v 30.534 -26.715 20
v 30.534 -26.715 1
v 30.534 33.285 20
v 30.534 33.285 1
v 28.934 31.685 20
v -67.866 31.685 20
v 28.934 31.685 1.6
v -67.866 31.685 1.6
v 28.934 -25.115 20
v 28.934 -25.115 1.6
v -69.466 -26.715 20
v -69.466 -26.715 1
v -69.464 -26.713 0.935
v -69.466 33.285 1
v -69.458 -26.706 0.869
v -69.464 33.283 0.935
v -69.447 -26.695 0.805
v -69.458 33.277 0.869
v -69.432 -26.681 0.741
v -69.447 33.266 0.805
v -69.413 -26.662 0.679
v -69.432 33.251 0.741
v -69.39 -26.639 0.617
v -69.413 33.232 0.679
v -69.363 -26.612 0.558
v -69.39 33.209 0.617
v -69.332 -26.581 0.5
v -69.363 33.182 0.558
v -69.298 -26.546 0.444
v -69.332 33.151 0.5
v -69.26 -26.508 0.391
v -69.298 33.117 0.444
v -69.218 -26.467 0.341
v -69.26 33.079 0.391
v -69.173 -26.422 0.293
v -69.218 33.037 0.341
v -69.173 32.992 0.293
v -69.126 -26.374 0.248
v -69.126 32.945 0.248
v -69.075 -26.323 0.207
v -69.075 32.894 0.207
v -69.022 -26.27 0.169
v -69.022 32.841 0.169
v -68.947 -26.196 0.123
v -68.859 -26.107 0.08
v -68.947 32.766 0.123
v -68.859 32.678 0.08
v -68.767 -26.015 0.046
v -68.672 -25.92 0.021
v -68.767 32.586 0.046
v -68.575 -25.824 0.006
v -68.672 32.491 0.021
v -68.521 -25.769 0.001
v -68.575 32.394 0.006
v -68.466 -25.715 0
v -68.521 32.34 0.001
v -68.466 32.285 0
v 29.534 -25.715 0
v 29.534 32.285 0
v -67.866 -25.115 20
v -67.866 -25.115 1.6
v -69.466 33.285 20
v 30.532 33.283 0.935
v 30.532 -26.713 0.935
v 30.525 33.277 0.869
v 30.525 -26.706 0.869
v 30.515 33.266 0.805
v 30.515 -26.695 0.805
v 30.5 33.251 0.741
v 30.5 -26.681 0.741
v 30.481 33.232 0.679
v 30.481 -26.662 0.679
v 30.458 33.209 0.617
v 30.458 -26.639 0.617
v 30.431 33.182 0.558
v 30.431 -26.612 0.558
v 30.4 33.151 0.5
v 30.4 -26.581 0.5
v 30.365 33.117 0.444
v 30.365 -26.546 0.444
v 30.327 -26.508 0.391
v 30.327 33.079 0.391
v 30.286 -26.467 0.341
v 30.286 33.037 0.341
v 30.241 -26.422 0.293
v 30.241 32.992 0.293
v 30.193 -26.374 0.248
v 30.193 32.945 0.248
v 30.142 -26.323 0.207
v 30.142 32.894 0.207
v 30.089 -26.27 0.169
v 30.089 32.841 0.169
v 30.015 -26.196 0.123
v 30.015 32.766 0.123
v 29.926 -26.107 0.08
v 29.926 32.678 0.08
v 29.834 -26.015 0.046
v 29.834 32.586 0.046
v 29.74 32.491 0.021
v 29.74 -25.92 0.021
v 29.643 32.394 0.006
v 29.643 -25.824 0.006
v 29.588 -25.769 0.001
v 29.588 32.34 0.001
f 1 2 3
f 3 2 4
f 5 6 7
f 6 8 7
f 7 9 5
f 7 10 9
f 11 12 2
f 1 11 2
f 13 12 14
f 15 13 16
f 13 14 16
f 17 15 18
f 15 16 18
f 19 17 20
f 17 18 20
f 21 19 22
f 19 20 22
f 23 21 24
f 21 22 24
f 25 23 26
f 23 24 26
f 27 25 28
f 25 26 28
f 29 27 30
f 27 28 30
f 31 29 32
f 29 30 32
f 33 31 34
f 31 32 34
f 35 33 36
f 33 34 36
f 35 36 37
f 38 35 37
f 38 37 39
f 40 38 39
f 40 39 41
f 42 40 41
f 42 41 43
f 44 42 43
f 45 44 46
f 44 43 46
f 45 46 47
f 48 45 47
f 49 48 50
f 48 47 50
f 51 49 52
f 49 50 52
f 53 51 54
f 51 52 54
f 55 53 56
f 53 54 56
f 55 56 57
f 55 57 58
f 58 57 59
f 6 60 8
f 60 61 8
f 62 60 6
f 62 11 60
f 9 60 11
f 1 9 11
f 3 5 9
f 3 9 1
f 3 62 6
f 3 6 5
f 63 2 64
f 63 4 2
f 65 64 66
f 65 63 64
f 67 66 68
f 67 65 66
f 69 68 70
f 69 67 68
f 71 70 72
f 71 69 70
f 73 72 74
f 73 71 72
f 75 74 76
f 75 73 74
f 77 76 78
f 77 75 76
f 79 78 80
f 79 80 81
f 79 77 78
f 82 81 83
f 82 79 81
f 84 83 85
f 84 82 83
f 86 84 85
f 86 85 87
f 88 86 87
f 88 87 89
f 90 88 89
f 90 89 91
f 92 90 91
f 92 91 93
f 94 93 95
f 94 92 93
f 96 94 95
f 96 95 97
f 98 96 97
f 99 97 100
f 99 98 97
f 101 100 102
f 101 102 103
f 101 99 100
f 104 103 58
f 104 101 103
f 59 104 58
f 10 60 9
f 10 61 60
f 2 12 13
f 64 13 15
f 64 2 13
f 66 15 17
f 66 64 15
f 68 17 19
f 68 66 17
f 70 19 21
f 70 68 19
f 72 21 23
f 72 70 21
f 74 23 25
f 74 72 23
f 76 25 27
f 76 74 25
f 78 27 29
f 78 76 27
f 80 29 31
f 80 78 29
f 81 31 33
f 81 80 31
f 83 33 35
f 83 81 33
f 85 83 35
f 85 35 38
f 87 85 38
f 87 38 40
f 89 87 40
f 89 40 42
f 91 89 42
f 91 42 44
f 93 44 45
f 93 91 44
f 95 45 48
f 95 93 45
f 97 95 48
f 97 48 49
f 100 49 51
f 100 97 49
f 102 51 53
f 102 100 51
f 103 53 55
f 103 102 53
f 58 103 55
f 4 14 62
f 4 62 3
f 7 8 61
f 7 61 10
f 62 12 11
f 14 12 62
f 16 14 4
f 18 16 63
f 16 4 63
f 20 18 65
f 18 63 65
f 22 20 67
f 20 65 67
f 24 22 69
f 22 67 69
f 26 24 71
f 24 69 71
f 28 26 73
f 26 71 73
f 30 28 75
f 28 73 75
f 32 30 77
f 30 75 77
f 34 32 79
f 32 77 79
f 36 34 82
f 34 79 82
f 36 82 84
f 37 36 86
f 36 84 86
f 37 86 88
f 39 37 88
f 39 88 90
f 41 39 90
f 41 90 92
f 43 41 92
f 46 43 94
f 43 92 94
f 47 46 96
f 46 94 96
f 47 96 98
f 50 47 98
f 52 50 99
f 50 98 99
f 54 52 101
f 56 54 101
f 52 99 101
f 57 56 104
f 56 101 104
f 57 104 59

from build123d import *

# Parameters (mm, degrees)
F0_W     = 100
F0_H     = 60
F1_DEPTH = 20
F2_T     = -1.6
F3_R     = 1


with BuildPart() as f1:
    # F0 (on Top) → F1 (new body)
    with BuildSketch(Plane.XY):
        with Locations((-19.466264, 3.285318)):
            Rectangle(F0_W, F0_H)
    extrude(amount=F1_DEPTH)

    # F2
    f2_openings = [f1.faces().sort_by_distance(p)[0] for p in [
        (-19.466264, 3.285318, 20),
    ]]
    offset(amount=F2_T, openings=f2_openings)

    # F3
    f3_edges = [f1.edges().sort_by_distance(p)[0] for p in [
        (-69.466264, 3.285318, 0),
        (-19.466264, -26.714682, 0),
        (30.533736, 3.285318, 0),
        (-19.466264, 33.285318, 0),
    ]]
    fillet(f3_edges, radius=F3_R)


solid = f1.part
